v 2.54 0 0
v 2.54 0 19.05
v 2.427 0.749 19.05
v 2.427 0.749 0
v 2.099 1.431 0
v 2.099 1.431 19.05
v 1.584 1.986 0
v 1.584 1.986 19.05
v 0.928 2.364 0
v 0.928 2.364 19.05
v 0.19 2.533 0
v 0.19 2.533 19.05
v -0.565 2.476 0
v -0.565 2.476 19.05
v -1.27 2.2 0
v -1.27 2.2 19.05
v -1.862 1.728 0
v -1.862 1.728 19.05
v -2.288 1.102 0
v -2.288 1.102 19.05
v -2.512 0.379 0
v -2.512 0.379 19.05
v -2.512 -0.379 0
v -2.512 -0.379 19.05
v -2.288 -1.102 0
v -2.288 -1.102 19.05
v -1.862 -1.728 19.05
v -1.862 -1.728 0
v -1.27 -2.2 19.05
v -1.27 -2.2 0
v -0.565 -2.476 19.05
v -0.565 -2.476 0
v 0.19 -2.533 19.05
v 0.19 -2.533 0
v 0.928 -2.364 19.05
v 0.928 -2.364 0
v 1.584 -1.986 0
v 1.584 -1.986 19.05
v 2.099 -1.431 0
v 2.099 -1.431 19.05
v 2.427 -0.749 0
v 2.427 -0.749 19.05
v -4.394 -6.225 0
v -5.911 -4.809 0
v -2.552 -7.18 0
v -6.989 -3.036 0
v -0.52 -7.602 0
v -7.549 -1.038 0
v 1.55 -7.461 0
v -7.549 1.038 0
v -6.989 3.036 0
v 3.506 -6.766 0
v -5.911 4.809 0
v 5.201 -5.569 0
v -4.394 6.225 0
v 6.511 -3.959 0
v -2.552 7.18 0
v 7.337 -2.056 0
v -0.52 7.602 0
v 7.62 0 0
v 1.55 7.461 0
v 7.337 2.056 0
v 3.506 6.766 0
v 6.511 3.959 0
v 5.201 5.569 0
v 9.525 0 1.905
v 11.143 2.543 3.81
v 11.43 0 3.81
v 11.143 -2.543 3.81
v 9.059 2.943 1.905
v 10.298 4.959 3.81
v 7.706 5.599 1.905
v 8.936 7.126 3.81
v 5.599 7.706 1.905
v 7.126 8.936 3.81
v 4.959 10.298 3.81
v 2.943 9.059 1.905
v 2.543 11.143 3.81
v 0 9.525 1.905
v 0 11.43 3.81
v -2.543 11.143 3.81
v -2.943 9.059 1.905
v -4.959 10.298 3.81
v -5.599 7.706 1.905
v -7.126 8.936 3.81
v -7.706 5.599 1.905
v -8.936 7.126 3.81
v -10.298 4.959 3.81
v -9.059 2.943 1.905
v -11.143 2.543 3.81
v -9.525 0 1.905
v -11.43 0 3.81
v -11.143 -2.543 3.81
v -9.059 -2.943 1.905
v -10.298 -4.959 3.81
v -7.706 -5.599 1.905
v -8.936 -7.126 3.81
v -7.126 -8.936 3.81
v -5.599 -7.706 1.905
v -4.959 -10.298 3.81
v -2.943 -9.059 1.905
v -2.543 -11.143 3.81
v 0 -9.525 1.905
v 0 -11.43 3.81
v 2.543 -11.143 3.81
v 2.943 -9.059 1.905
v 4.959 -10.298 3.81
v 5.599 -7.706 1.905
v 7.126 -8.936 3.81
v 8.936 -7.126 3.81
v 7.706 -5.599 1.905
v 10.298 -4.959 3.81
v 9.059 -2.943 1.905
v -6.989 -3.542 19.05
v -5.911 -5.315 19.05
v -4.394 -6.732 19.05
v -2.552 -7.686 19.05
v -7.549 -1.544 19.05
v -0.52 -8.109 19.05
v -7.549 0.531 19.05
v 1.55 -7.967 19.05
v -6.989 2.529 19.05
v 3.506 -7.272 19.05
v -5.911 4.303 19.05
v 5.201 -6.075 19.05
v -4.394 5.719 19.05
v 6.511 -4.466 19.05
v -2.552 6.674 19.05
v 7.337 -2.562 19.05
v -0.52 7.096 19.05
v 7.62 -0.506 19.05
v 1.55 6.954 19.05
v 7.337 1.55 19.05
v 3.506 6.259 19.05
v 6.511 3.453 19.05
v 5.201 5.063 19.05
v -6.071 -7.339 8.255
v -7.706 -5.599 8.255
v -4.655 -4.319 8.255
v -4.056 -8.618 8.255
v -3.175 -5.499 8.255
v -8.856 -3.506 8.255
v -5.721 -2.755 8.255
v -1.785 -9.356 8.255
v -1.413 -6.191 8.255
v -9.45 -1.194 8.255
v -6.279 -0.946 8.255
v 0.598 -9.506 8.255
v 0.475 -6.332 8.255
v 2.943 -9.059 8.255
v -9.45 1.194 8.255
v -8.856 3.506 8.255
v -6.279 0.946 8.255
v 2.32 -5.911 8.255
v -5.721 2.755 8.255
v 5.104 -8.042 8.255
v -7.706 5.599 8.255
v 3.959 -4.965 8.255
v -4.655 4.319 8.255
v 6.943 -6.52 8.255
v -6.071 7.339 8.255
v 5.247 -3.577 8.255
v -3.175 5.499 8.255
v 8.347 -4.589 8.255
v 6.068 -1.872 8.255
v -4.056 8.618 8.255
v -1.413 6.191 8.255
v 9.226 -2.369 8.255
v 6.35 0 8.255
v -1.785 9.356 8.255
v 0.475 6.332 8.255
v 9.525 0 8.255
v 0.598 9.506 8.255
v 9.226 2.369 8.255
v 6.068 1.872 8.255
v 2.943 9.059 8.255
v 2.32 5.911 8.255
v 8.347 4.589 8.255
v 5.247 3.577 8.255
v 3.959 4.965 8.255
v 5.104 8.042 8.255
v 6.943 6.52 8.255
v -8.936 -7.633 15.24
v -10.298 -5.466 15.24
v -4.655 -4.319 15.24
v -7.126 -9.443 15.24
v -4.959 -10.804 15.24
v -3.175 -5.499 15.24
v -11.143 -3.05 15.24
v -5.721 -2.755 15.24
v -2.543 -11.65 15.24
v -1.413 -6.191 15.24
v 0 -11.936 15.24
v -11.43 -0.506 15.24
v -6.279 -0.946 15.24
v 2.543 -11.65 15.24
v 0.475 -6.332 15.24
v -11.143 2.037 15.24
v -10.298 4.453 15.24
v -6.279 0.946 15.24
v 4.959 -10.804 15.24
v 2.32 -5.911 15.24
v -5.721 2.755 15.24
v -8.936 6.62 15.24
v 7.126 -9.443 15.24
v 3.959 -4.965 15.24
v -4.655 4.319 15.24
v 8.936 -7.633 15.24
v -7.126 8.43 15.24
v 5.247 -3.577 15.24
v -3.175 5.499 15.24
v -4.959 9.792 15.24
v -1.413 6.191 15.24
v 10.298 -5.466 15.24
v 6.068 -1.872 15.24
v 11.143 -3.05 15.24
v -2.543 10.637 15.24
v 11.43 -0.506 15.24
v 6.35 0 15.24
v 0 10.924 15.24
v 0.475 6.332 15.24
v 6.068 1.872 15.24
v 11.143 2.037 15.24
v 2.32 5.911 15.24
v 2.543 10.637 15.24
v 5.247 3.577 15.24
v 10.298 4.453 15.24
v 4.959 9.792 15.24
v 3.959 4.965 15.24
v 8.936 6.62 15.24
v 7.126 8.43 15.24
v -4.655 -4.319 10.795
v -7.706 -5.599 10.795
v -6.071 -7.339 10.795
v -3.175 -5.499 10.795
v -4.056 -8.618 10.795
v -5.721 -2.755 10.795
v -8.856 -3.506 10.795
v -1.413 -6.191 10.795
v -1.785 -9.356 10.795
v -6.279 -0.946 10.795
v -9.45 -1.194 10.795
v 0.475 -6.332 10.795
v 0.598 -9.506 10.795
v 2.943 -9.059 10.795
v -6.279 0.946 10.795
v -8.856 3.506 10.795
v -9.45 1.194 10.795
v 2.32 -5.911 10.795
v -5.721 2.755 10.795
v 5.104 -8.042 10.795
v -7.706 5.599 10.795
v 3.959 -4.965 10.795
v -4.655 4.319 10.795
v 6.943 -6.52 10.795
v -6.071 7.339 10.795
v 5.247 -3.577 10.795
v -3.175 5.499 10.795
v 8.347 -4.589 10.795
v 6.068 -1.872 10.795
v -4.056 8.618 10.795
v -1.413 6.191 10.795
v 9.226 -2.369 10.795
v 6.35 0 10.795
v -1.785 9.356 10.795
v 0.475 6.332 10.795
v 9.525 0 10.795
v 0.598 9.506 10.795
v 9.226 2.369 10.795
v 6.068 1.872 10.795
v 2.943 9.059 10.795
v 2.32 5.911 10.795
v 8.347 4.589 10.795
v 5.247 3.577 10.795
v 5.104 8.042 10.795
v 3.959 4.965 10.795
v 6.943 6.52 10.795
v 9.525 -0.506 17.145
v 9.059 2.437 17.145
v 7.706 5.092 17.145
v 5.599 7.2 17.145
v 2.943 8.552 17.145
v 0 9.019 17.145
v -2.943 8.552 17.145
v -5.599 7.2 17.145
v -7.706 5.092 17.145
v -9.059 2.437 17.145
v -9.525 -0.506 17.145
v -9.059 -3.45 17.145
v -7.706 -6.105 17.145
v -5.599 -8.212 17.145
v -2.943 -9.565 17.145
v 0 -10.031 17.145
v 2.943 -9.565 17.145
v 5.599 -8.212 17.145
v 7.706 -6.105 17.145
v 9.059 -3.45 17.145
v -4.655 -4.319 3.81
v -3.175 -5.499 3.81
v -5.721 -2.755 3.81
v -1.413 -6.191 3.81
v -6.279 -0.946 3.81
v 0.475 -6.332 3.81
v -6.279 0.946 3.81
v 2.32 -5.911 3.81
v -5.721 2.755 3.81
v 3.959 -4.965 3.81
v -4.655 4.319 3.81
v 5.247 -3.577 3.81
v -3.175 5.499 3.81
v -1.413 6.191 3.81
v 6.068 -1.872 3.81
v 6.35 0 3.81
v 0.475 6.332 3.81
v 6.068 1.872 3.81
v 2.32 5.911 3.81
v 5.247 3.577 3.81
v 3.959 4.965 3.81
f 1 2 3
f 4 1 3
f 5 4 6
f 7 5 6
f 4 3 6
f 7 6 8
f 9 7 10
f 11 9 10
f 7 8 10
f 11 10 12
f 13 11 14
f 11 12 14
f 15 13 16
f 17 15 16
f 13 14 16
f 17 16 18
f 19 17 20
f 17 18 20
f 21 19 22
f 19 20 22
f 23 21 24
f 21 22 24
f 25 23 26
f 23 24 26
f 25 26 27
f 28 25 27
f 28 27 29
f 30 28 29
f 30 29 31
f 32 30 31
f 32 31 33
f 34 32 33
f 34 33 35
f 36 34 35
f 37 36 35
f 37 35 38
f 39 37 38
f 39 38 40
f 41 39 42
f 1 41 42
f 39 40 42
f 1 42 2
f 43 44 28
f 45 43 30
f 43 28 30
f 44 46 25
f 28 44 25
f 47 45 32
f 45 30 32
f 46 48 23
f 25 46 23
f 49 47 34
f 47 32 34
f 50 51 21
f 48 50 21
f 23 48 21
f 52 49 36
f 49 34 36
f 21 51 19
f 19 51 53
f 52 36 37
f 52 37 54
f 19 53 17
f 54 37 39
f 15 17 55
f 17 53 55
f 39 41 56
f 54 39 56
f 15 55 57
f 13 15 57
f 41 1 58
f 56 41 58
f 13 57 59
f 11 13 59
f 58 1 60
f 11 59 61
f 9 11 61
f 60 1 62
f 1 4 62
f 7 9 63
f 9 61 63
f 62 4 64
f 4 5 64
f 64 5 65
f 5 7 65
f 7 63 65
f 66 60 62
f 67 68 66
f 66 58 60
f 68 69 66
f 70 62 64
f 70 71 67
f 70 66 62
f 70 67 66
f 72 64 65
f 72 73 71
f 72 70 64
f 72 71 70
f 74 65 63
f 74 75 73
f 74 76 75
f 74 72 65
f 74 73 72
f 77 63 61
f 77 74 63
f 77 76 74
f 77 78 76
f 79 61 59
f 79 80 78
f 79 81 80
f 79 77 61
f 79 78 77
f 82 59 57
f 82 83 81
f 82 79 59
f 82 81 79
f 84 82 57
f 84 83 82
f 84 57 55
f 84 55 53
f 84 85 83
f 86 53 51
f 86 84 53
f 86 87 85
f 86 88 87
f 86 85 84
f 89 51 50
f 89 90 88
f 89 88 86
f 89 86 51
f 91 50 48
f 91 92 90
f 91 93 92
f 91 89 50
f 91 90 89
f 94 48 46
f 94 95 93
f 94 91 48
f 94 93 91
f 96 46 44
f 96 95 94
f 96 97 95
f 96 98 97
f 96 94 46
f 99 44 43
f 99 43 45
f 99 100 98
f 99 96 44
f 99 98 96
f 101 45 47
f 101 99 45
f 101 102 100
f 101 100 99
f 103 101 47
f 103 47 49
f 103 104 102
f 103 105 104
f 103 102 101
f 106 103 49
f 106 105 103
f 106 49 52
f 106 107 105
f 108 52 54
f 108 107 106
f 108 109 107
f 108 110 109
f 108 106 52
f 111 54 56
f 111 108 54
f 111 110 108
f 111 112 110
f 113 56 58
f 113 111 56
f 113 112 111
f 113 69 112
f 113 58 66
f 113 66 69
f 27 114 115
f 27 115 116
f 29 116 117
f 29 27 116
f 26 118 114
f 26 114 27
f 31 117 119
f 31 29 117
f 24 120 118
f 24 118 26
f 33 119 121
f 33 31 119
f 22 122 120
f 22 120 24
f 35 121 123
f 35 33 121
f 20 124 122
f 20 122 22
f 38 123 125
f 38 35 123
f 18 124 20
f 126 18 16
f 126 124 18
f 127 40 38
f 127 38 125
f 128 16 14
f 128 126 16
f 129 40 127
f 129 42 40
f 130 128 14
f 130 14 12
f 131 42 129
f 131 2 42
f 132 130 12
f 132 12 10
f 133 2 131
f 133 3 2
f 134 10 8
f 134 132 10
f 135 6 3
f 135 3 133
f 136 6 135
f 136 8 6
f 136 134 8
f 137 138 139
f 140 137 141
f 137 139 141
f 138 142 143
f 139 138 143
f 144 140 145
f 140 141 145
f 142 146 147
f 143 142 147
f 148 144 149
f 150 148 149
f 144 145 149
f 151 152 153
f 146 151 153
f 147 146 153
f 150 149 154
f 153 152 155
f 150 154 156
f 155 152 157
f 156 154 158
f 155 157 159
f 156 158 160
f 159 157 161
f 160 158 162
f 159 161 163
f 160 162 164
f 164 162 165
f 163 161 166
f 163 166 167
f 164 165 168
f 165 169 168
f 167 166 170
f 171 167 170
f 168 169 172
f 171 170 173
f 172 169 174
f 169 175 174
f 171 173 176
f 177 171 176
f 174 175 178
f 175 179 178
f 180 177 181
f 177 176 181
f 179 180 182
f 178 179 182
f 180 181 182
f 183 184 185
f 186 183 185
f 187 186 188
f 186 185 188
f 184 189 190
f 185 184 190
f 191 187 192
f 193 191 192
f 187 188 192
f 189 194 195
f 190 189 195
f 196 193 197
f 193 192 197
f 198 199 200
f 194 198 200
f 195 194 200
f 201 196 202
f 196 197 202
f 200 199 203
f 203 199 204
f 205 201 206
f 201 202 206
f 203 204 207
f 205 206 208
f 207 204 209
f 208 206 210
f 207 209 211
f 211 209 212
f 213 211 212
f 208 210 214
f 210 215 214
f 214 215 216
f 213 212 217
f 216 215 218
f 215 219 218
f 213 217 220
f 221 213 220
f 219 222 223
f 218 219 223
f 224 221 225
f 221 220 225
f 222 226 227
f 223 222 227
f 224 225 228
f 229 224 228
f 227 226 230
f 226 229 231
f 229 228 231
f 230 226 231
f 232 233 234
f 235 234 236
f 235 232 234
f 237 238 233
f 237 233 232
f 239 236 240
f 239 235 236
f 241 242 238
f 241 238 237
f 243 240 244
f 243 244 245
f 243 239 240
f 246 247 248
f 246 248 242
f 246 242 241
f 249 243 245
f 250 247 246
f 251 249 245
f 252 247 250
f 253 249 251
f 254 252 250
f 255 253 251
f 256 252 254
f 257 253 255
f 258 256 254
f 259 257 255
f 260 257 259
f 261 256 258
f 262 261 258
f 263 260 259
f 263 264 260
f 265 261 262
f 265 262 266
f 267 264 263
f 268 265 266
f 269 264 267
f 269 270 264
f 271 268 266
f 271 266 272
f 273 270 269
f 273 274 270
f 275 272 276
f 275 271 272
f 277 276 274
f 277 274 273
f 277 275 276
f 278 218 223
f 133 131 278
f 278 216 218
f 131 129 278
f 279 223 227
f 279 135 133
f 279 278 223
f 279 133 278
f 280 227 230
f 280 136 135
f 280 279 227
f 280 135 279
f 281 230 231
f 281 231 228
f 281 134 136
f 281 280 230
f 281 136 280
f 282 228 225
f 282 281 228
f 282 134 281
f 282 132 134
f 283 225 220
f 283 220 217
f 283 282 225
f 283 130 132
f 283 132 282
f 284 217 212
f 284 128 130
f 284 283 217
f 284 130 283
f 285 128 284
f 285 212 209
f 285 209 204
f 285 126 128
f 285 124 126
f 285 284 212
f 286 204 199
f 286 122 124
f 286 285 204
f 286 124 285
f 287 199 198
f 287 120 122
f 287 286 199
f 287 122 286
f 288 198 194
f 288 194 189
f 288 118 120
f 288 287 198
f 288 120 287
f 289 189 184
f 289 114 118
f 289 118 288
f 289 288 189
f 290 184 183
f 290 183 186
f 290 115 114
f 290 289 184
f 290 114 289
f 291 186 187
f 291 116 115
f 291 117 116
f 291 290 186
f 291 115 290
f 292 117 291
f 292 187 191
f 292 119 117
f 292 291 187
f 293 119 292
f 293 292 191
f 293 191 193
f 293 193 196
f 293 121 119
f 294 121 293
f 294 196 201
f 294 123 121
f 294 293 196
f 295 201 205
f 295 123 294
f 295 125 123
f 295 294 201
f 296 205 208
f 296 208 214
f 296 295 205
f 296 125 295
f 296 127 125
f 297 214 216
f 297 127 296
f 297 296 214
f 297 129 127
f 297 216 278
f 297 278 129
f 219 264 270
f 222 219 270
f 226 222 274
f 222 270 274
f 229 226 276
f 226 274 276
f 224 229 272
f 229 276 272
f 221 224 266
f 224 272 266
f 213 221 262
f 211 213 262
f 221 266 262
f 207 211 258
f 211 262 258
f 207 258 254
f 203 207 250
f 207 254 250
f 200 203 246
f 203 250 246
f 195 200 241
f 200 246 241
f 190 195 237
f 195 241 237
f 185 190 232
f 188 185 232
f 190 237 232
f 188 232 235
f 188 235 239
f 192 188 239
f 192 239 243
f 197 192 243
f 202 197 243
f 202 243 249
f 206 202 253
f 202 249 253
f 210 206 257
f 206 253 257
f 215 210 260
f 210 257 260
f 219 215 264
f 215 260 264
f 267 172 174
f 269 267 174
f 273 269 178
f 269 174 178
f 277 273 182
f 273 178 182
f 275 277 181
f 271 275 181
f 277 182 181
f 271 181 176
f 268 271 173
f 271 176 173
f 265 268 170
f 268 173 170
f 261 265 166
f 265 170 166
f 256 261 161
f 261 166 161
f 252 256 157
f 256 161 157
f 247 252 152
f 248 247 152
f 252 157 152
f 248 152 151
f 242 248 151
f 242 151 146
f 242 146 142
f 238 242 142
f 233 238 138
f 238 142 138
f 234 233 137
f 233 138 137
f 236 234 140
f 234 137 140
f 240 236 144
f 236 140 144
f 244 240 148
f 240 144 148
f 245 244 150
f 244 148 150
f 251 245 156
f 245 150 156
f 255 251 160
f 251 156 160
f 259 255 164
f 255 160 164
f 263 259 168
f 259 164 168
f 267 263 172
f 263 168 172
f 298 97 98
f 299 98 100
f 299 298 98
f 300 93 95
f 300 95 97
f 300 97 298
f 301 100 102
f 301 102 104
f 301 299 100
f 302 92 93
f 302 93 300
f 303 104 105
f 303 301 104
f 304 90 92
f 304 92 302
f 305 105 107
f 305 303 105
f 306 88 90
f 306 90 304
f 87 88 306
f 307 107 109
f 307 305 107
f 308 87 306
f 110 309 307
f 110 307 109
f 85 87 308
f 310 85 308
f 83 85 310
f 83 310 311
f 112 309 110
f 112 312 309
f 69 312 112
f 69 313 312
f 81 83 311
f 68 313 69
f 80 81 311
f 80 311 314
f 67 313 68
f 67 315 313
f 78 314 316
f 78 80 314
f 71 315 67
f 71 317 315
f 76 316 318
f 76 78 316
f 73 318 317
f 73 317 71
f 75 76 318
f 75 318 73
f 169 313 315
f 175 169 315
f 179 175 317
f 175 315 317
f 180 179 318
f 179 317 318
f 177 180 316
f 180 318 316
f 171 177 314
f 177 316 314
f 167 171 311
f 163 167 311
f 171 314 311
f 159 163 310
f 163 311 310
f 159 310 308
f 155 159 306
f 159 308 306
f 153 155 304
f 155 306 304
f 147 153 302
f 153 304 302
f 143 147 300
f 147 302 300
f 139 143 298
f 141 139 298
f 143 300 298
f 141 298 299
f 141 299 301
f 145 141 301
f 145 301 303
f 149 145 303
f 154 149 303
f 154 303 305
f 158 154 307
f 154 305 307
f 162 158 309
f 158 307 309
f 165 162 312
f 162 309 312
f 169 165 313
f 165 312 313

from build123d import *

# Parameters (mm, degrees)
F0_R      = 12.7
F1_DEPTH  = 3.81
F2_R      = 6.35
F3_DEPTH  = 4.445
F4_R      = 9.525
F5_DEPTH  = 2.54
F6_R      = 6.35
F7_DEPTH  = 4.445
F8_R      = 12.7
F9_DEPTH  = 3.81
F10_R     = 2.54
F11_DEPTH = 19.05


# Not quite as in the source:
# - a fillet or chamfer that OpenCascade refuses, or shapes differently, is made with other operations: its cross-section is extruded or revolved along the edge and cut away or added


with BuildPart() as f1:
    # F0 (on Top) → F1 (new body)
    with BuildSketch(Plane.XY):
        Circle(F0_R)
    extrude(amount=F1_DEPTH)

    # F2 (on face) → F3 (join)
    with BuildSketch(Plane.XY.offset(3.81)):
        Circle(F2_R)
    extrude(amount=F3_DEPTH)

    # F4 (on face) → F5 (join)
    with BuildSketch(Plane.XY.offset(8.255)):
        Circle(F4_R)
    extrude(amount=F5_DEPTH)

    # F6 (on face) → F7 (join)
    with BuildSketch(Plane.XY.offset(10.795)):
        Circle(F6_R)
    extrude(amount=F7_DEPTH)

    # F8 (on face) → F9 (join)
    with BuildSketch(Plane.XY.offset(15.24)):
        with Locations((0, -0.5063372408)):
            Circle(F8_R)
    extrude(amount=F9_DEPTH)

    # F10 (on face) → F11 (cut)
    with BuildSketch(Plane.XY.offset(19.05)):
        Circle(F10_R)
    extrude(amount=-F11_DEPTH, mode=Mode.SUBTRACT)

    # F12: chamfer of 5.08 on 1 edges, made by hand

    # F12_s1 → F12_t2 (revolve, cut)
    with BuildSketch(Plane.XZ.offset(0.5063372408)):
        Polygon((12.7, 13.97), (7.62, 19.05), (12.7, 19.05), align=None)
    revolve(axis=Axis((0, -0.5063372408, 19.05), (0, 0, 1)), mode=Mode.SUBTRACT)

    # F13: chamfer of 5.08 on 1 edges, made by hand

    # F13_s1 → F13_t2 (revolve, cut)
    with BuildSketch(Plane.XZ):
        Polygon((7.62, 0), (12.7, 5.08), (12.7, 0), align=None)
    revolve(axis=Axis((0, 0, 0), (0, 0, 1)), mode=Mode.SUBTRACT)


solid = f1.part
